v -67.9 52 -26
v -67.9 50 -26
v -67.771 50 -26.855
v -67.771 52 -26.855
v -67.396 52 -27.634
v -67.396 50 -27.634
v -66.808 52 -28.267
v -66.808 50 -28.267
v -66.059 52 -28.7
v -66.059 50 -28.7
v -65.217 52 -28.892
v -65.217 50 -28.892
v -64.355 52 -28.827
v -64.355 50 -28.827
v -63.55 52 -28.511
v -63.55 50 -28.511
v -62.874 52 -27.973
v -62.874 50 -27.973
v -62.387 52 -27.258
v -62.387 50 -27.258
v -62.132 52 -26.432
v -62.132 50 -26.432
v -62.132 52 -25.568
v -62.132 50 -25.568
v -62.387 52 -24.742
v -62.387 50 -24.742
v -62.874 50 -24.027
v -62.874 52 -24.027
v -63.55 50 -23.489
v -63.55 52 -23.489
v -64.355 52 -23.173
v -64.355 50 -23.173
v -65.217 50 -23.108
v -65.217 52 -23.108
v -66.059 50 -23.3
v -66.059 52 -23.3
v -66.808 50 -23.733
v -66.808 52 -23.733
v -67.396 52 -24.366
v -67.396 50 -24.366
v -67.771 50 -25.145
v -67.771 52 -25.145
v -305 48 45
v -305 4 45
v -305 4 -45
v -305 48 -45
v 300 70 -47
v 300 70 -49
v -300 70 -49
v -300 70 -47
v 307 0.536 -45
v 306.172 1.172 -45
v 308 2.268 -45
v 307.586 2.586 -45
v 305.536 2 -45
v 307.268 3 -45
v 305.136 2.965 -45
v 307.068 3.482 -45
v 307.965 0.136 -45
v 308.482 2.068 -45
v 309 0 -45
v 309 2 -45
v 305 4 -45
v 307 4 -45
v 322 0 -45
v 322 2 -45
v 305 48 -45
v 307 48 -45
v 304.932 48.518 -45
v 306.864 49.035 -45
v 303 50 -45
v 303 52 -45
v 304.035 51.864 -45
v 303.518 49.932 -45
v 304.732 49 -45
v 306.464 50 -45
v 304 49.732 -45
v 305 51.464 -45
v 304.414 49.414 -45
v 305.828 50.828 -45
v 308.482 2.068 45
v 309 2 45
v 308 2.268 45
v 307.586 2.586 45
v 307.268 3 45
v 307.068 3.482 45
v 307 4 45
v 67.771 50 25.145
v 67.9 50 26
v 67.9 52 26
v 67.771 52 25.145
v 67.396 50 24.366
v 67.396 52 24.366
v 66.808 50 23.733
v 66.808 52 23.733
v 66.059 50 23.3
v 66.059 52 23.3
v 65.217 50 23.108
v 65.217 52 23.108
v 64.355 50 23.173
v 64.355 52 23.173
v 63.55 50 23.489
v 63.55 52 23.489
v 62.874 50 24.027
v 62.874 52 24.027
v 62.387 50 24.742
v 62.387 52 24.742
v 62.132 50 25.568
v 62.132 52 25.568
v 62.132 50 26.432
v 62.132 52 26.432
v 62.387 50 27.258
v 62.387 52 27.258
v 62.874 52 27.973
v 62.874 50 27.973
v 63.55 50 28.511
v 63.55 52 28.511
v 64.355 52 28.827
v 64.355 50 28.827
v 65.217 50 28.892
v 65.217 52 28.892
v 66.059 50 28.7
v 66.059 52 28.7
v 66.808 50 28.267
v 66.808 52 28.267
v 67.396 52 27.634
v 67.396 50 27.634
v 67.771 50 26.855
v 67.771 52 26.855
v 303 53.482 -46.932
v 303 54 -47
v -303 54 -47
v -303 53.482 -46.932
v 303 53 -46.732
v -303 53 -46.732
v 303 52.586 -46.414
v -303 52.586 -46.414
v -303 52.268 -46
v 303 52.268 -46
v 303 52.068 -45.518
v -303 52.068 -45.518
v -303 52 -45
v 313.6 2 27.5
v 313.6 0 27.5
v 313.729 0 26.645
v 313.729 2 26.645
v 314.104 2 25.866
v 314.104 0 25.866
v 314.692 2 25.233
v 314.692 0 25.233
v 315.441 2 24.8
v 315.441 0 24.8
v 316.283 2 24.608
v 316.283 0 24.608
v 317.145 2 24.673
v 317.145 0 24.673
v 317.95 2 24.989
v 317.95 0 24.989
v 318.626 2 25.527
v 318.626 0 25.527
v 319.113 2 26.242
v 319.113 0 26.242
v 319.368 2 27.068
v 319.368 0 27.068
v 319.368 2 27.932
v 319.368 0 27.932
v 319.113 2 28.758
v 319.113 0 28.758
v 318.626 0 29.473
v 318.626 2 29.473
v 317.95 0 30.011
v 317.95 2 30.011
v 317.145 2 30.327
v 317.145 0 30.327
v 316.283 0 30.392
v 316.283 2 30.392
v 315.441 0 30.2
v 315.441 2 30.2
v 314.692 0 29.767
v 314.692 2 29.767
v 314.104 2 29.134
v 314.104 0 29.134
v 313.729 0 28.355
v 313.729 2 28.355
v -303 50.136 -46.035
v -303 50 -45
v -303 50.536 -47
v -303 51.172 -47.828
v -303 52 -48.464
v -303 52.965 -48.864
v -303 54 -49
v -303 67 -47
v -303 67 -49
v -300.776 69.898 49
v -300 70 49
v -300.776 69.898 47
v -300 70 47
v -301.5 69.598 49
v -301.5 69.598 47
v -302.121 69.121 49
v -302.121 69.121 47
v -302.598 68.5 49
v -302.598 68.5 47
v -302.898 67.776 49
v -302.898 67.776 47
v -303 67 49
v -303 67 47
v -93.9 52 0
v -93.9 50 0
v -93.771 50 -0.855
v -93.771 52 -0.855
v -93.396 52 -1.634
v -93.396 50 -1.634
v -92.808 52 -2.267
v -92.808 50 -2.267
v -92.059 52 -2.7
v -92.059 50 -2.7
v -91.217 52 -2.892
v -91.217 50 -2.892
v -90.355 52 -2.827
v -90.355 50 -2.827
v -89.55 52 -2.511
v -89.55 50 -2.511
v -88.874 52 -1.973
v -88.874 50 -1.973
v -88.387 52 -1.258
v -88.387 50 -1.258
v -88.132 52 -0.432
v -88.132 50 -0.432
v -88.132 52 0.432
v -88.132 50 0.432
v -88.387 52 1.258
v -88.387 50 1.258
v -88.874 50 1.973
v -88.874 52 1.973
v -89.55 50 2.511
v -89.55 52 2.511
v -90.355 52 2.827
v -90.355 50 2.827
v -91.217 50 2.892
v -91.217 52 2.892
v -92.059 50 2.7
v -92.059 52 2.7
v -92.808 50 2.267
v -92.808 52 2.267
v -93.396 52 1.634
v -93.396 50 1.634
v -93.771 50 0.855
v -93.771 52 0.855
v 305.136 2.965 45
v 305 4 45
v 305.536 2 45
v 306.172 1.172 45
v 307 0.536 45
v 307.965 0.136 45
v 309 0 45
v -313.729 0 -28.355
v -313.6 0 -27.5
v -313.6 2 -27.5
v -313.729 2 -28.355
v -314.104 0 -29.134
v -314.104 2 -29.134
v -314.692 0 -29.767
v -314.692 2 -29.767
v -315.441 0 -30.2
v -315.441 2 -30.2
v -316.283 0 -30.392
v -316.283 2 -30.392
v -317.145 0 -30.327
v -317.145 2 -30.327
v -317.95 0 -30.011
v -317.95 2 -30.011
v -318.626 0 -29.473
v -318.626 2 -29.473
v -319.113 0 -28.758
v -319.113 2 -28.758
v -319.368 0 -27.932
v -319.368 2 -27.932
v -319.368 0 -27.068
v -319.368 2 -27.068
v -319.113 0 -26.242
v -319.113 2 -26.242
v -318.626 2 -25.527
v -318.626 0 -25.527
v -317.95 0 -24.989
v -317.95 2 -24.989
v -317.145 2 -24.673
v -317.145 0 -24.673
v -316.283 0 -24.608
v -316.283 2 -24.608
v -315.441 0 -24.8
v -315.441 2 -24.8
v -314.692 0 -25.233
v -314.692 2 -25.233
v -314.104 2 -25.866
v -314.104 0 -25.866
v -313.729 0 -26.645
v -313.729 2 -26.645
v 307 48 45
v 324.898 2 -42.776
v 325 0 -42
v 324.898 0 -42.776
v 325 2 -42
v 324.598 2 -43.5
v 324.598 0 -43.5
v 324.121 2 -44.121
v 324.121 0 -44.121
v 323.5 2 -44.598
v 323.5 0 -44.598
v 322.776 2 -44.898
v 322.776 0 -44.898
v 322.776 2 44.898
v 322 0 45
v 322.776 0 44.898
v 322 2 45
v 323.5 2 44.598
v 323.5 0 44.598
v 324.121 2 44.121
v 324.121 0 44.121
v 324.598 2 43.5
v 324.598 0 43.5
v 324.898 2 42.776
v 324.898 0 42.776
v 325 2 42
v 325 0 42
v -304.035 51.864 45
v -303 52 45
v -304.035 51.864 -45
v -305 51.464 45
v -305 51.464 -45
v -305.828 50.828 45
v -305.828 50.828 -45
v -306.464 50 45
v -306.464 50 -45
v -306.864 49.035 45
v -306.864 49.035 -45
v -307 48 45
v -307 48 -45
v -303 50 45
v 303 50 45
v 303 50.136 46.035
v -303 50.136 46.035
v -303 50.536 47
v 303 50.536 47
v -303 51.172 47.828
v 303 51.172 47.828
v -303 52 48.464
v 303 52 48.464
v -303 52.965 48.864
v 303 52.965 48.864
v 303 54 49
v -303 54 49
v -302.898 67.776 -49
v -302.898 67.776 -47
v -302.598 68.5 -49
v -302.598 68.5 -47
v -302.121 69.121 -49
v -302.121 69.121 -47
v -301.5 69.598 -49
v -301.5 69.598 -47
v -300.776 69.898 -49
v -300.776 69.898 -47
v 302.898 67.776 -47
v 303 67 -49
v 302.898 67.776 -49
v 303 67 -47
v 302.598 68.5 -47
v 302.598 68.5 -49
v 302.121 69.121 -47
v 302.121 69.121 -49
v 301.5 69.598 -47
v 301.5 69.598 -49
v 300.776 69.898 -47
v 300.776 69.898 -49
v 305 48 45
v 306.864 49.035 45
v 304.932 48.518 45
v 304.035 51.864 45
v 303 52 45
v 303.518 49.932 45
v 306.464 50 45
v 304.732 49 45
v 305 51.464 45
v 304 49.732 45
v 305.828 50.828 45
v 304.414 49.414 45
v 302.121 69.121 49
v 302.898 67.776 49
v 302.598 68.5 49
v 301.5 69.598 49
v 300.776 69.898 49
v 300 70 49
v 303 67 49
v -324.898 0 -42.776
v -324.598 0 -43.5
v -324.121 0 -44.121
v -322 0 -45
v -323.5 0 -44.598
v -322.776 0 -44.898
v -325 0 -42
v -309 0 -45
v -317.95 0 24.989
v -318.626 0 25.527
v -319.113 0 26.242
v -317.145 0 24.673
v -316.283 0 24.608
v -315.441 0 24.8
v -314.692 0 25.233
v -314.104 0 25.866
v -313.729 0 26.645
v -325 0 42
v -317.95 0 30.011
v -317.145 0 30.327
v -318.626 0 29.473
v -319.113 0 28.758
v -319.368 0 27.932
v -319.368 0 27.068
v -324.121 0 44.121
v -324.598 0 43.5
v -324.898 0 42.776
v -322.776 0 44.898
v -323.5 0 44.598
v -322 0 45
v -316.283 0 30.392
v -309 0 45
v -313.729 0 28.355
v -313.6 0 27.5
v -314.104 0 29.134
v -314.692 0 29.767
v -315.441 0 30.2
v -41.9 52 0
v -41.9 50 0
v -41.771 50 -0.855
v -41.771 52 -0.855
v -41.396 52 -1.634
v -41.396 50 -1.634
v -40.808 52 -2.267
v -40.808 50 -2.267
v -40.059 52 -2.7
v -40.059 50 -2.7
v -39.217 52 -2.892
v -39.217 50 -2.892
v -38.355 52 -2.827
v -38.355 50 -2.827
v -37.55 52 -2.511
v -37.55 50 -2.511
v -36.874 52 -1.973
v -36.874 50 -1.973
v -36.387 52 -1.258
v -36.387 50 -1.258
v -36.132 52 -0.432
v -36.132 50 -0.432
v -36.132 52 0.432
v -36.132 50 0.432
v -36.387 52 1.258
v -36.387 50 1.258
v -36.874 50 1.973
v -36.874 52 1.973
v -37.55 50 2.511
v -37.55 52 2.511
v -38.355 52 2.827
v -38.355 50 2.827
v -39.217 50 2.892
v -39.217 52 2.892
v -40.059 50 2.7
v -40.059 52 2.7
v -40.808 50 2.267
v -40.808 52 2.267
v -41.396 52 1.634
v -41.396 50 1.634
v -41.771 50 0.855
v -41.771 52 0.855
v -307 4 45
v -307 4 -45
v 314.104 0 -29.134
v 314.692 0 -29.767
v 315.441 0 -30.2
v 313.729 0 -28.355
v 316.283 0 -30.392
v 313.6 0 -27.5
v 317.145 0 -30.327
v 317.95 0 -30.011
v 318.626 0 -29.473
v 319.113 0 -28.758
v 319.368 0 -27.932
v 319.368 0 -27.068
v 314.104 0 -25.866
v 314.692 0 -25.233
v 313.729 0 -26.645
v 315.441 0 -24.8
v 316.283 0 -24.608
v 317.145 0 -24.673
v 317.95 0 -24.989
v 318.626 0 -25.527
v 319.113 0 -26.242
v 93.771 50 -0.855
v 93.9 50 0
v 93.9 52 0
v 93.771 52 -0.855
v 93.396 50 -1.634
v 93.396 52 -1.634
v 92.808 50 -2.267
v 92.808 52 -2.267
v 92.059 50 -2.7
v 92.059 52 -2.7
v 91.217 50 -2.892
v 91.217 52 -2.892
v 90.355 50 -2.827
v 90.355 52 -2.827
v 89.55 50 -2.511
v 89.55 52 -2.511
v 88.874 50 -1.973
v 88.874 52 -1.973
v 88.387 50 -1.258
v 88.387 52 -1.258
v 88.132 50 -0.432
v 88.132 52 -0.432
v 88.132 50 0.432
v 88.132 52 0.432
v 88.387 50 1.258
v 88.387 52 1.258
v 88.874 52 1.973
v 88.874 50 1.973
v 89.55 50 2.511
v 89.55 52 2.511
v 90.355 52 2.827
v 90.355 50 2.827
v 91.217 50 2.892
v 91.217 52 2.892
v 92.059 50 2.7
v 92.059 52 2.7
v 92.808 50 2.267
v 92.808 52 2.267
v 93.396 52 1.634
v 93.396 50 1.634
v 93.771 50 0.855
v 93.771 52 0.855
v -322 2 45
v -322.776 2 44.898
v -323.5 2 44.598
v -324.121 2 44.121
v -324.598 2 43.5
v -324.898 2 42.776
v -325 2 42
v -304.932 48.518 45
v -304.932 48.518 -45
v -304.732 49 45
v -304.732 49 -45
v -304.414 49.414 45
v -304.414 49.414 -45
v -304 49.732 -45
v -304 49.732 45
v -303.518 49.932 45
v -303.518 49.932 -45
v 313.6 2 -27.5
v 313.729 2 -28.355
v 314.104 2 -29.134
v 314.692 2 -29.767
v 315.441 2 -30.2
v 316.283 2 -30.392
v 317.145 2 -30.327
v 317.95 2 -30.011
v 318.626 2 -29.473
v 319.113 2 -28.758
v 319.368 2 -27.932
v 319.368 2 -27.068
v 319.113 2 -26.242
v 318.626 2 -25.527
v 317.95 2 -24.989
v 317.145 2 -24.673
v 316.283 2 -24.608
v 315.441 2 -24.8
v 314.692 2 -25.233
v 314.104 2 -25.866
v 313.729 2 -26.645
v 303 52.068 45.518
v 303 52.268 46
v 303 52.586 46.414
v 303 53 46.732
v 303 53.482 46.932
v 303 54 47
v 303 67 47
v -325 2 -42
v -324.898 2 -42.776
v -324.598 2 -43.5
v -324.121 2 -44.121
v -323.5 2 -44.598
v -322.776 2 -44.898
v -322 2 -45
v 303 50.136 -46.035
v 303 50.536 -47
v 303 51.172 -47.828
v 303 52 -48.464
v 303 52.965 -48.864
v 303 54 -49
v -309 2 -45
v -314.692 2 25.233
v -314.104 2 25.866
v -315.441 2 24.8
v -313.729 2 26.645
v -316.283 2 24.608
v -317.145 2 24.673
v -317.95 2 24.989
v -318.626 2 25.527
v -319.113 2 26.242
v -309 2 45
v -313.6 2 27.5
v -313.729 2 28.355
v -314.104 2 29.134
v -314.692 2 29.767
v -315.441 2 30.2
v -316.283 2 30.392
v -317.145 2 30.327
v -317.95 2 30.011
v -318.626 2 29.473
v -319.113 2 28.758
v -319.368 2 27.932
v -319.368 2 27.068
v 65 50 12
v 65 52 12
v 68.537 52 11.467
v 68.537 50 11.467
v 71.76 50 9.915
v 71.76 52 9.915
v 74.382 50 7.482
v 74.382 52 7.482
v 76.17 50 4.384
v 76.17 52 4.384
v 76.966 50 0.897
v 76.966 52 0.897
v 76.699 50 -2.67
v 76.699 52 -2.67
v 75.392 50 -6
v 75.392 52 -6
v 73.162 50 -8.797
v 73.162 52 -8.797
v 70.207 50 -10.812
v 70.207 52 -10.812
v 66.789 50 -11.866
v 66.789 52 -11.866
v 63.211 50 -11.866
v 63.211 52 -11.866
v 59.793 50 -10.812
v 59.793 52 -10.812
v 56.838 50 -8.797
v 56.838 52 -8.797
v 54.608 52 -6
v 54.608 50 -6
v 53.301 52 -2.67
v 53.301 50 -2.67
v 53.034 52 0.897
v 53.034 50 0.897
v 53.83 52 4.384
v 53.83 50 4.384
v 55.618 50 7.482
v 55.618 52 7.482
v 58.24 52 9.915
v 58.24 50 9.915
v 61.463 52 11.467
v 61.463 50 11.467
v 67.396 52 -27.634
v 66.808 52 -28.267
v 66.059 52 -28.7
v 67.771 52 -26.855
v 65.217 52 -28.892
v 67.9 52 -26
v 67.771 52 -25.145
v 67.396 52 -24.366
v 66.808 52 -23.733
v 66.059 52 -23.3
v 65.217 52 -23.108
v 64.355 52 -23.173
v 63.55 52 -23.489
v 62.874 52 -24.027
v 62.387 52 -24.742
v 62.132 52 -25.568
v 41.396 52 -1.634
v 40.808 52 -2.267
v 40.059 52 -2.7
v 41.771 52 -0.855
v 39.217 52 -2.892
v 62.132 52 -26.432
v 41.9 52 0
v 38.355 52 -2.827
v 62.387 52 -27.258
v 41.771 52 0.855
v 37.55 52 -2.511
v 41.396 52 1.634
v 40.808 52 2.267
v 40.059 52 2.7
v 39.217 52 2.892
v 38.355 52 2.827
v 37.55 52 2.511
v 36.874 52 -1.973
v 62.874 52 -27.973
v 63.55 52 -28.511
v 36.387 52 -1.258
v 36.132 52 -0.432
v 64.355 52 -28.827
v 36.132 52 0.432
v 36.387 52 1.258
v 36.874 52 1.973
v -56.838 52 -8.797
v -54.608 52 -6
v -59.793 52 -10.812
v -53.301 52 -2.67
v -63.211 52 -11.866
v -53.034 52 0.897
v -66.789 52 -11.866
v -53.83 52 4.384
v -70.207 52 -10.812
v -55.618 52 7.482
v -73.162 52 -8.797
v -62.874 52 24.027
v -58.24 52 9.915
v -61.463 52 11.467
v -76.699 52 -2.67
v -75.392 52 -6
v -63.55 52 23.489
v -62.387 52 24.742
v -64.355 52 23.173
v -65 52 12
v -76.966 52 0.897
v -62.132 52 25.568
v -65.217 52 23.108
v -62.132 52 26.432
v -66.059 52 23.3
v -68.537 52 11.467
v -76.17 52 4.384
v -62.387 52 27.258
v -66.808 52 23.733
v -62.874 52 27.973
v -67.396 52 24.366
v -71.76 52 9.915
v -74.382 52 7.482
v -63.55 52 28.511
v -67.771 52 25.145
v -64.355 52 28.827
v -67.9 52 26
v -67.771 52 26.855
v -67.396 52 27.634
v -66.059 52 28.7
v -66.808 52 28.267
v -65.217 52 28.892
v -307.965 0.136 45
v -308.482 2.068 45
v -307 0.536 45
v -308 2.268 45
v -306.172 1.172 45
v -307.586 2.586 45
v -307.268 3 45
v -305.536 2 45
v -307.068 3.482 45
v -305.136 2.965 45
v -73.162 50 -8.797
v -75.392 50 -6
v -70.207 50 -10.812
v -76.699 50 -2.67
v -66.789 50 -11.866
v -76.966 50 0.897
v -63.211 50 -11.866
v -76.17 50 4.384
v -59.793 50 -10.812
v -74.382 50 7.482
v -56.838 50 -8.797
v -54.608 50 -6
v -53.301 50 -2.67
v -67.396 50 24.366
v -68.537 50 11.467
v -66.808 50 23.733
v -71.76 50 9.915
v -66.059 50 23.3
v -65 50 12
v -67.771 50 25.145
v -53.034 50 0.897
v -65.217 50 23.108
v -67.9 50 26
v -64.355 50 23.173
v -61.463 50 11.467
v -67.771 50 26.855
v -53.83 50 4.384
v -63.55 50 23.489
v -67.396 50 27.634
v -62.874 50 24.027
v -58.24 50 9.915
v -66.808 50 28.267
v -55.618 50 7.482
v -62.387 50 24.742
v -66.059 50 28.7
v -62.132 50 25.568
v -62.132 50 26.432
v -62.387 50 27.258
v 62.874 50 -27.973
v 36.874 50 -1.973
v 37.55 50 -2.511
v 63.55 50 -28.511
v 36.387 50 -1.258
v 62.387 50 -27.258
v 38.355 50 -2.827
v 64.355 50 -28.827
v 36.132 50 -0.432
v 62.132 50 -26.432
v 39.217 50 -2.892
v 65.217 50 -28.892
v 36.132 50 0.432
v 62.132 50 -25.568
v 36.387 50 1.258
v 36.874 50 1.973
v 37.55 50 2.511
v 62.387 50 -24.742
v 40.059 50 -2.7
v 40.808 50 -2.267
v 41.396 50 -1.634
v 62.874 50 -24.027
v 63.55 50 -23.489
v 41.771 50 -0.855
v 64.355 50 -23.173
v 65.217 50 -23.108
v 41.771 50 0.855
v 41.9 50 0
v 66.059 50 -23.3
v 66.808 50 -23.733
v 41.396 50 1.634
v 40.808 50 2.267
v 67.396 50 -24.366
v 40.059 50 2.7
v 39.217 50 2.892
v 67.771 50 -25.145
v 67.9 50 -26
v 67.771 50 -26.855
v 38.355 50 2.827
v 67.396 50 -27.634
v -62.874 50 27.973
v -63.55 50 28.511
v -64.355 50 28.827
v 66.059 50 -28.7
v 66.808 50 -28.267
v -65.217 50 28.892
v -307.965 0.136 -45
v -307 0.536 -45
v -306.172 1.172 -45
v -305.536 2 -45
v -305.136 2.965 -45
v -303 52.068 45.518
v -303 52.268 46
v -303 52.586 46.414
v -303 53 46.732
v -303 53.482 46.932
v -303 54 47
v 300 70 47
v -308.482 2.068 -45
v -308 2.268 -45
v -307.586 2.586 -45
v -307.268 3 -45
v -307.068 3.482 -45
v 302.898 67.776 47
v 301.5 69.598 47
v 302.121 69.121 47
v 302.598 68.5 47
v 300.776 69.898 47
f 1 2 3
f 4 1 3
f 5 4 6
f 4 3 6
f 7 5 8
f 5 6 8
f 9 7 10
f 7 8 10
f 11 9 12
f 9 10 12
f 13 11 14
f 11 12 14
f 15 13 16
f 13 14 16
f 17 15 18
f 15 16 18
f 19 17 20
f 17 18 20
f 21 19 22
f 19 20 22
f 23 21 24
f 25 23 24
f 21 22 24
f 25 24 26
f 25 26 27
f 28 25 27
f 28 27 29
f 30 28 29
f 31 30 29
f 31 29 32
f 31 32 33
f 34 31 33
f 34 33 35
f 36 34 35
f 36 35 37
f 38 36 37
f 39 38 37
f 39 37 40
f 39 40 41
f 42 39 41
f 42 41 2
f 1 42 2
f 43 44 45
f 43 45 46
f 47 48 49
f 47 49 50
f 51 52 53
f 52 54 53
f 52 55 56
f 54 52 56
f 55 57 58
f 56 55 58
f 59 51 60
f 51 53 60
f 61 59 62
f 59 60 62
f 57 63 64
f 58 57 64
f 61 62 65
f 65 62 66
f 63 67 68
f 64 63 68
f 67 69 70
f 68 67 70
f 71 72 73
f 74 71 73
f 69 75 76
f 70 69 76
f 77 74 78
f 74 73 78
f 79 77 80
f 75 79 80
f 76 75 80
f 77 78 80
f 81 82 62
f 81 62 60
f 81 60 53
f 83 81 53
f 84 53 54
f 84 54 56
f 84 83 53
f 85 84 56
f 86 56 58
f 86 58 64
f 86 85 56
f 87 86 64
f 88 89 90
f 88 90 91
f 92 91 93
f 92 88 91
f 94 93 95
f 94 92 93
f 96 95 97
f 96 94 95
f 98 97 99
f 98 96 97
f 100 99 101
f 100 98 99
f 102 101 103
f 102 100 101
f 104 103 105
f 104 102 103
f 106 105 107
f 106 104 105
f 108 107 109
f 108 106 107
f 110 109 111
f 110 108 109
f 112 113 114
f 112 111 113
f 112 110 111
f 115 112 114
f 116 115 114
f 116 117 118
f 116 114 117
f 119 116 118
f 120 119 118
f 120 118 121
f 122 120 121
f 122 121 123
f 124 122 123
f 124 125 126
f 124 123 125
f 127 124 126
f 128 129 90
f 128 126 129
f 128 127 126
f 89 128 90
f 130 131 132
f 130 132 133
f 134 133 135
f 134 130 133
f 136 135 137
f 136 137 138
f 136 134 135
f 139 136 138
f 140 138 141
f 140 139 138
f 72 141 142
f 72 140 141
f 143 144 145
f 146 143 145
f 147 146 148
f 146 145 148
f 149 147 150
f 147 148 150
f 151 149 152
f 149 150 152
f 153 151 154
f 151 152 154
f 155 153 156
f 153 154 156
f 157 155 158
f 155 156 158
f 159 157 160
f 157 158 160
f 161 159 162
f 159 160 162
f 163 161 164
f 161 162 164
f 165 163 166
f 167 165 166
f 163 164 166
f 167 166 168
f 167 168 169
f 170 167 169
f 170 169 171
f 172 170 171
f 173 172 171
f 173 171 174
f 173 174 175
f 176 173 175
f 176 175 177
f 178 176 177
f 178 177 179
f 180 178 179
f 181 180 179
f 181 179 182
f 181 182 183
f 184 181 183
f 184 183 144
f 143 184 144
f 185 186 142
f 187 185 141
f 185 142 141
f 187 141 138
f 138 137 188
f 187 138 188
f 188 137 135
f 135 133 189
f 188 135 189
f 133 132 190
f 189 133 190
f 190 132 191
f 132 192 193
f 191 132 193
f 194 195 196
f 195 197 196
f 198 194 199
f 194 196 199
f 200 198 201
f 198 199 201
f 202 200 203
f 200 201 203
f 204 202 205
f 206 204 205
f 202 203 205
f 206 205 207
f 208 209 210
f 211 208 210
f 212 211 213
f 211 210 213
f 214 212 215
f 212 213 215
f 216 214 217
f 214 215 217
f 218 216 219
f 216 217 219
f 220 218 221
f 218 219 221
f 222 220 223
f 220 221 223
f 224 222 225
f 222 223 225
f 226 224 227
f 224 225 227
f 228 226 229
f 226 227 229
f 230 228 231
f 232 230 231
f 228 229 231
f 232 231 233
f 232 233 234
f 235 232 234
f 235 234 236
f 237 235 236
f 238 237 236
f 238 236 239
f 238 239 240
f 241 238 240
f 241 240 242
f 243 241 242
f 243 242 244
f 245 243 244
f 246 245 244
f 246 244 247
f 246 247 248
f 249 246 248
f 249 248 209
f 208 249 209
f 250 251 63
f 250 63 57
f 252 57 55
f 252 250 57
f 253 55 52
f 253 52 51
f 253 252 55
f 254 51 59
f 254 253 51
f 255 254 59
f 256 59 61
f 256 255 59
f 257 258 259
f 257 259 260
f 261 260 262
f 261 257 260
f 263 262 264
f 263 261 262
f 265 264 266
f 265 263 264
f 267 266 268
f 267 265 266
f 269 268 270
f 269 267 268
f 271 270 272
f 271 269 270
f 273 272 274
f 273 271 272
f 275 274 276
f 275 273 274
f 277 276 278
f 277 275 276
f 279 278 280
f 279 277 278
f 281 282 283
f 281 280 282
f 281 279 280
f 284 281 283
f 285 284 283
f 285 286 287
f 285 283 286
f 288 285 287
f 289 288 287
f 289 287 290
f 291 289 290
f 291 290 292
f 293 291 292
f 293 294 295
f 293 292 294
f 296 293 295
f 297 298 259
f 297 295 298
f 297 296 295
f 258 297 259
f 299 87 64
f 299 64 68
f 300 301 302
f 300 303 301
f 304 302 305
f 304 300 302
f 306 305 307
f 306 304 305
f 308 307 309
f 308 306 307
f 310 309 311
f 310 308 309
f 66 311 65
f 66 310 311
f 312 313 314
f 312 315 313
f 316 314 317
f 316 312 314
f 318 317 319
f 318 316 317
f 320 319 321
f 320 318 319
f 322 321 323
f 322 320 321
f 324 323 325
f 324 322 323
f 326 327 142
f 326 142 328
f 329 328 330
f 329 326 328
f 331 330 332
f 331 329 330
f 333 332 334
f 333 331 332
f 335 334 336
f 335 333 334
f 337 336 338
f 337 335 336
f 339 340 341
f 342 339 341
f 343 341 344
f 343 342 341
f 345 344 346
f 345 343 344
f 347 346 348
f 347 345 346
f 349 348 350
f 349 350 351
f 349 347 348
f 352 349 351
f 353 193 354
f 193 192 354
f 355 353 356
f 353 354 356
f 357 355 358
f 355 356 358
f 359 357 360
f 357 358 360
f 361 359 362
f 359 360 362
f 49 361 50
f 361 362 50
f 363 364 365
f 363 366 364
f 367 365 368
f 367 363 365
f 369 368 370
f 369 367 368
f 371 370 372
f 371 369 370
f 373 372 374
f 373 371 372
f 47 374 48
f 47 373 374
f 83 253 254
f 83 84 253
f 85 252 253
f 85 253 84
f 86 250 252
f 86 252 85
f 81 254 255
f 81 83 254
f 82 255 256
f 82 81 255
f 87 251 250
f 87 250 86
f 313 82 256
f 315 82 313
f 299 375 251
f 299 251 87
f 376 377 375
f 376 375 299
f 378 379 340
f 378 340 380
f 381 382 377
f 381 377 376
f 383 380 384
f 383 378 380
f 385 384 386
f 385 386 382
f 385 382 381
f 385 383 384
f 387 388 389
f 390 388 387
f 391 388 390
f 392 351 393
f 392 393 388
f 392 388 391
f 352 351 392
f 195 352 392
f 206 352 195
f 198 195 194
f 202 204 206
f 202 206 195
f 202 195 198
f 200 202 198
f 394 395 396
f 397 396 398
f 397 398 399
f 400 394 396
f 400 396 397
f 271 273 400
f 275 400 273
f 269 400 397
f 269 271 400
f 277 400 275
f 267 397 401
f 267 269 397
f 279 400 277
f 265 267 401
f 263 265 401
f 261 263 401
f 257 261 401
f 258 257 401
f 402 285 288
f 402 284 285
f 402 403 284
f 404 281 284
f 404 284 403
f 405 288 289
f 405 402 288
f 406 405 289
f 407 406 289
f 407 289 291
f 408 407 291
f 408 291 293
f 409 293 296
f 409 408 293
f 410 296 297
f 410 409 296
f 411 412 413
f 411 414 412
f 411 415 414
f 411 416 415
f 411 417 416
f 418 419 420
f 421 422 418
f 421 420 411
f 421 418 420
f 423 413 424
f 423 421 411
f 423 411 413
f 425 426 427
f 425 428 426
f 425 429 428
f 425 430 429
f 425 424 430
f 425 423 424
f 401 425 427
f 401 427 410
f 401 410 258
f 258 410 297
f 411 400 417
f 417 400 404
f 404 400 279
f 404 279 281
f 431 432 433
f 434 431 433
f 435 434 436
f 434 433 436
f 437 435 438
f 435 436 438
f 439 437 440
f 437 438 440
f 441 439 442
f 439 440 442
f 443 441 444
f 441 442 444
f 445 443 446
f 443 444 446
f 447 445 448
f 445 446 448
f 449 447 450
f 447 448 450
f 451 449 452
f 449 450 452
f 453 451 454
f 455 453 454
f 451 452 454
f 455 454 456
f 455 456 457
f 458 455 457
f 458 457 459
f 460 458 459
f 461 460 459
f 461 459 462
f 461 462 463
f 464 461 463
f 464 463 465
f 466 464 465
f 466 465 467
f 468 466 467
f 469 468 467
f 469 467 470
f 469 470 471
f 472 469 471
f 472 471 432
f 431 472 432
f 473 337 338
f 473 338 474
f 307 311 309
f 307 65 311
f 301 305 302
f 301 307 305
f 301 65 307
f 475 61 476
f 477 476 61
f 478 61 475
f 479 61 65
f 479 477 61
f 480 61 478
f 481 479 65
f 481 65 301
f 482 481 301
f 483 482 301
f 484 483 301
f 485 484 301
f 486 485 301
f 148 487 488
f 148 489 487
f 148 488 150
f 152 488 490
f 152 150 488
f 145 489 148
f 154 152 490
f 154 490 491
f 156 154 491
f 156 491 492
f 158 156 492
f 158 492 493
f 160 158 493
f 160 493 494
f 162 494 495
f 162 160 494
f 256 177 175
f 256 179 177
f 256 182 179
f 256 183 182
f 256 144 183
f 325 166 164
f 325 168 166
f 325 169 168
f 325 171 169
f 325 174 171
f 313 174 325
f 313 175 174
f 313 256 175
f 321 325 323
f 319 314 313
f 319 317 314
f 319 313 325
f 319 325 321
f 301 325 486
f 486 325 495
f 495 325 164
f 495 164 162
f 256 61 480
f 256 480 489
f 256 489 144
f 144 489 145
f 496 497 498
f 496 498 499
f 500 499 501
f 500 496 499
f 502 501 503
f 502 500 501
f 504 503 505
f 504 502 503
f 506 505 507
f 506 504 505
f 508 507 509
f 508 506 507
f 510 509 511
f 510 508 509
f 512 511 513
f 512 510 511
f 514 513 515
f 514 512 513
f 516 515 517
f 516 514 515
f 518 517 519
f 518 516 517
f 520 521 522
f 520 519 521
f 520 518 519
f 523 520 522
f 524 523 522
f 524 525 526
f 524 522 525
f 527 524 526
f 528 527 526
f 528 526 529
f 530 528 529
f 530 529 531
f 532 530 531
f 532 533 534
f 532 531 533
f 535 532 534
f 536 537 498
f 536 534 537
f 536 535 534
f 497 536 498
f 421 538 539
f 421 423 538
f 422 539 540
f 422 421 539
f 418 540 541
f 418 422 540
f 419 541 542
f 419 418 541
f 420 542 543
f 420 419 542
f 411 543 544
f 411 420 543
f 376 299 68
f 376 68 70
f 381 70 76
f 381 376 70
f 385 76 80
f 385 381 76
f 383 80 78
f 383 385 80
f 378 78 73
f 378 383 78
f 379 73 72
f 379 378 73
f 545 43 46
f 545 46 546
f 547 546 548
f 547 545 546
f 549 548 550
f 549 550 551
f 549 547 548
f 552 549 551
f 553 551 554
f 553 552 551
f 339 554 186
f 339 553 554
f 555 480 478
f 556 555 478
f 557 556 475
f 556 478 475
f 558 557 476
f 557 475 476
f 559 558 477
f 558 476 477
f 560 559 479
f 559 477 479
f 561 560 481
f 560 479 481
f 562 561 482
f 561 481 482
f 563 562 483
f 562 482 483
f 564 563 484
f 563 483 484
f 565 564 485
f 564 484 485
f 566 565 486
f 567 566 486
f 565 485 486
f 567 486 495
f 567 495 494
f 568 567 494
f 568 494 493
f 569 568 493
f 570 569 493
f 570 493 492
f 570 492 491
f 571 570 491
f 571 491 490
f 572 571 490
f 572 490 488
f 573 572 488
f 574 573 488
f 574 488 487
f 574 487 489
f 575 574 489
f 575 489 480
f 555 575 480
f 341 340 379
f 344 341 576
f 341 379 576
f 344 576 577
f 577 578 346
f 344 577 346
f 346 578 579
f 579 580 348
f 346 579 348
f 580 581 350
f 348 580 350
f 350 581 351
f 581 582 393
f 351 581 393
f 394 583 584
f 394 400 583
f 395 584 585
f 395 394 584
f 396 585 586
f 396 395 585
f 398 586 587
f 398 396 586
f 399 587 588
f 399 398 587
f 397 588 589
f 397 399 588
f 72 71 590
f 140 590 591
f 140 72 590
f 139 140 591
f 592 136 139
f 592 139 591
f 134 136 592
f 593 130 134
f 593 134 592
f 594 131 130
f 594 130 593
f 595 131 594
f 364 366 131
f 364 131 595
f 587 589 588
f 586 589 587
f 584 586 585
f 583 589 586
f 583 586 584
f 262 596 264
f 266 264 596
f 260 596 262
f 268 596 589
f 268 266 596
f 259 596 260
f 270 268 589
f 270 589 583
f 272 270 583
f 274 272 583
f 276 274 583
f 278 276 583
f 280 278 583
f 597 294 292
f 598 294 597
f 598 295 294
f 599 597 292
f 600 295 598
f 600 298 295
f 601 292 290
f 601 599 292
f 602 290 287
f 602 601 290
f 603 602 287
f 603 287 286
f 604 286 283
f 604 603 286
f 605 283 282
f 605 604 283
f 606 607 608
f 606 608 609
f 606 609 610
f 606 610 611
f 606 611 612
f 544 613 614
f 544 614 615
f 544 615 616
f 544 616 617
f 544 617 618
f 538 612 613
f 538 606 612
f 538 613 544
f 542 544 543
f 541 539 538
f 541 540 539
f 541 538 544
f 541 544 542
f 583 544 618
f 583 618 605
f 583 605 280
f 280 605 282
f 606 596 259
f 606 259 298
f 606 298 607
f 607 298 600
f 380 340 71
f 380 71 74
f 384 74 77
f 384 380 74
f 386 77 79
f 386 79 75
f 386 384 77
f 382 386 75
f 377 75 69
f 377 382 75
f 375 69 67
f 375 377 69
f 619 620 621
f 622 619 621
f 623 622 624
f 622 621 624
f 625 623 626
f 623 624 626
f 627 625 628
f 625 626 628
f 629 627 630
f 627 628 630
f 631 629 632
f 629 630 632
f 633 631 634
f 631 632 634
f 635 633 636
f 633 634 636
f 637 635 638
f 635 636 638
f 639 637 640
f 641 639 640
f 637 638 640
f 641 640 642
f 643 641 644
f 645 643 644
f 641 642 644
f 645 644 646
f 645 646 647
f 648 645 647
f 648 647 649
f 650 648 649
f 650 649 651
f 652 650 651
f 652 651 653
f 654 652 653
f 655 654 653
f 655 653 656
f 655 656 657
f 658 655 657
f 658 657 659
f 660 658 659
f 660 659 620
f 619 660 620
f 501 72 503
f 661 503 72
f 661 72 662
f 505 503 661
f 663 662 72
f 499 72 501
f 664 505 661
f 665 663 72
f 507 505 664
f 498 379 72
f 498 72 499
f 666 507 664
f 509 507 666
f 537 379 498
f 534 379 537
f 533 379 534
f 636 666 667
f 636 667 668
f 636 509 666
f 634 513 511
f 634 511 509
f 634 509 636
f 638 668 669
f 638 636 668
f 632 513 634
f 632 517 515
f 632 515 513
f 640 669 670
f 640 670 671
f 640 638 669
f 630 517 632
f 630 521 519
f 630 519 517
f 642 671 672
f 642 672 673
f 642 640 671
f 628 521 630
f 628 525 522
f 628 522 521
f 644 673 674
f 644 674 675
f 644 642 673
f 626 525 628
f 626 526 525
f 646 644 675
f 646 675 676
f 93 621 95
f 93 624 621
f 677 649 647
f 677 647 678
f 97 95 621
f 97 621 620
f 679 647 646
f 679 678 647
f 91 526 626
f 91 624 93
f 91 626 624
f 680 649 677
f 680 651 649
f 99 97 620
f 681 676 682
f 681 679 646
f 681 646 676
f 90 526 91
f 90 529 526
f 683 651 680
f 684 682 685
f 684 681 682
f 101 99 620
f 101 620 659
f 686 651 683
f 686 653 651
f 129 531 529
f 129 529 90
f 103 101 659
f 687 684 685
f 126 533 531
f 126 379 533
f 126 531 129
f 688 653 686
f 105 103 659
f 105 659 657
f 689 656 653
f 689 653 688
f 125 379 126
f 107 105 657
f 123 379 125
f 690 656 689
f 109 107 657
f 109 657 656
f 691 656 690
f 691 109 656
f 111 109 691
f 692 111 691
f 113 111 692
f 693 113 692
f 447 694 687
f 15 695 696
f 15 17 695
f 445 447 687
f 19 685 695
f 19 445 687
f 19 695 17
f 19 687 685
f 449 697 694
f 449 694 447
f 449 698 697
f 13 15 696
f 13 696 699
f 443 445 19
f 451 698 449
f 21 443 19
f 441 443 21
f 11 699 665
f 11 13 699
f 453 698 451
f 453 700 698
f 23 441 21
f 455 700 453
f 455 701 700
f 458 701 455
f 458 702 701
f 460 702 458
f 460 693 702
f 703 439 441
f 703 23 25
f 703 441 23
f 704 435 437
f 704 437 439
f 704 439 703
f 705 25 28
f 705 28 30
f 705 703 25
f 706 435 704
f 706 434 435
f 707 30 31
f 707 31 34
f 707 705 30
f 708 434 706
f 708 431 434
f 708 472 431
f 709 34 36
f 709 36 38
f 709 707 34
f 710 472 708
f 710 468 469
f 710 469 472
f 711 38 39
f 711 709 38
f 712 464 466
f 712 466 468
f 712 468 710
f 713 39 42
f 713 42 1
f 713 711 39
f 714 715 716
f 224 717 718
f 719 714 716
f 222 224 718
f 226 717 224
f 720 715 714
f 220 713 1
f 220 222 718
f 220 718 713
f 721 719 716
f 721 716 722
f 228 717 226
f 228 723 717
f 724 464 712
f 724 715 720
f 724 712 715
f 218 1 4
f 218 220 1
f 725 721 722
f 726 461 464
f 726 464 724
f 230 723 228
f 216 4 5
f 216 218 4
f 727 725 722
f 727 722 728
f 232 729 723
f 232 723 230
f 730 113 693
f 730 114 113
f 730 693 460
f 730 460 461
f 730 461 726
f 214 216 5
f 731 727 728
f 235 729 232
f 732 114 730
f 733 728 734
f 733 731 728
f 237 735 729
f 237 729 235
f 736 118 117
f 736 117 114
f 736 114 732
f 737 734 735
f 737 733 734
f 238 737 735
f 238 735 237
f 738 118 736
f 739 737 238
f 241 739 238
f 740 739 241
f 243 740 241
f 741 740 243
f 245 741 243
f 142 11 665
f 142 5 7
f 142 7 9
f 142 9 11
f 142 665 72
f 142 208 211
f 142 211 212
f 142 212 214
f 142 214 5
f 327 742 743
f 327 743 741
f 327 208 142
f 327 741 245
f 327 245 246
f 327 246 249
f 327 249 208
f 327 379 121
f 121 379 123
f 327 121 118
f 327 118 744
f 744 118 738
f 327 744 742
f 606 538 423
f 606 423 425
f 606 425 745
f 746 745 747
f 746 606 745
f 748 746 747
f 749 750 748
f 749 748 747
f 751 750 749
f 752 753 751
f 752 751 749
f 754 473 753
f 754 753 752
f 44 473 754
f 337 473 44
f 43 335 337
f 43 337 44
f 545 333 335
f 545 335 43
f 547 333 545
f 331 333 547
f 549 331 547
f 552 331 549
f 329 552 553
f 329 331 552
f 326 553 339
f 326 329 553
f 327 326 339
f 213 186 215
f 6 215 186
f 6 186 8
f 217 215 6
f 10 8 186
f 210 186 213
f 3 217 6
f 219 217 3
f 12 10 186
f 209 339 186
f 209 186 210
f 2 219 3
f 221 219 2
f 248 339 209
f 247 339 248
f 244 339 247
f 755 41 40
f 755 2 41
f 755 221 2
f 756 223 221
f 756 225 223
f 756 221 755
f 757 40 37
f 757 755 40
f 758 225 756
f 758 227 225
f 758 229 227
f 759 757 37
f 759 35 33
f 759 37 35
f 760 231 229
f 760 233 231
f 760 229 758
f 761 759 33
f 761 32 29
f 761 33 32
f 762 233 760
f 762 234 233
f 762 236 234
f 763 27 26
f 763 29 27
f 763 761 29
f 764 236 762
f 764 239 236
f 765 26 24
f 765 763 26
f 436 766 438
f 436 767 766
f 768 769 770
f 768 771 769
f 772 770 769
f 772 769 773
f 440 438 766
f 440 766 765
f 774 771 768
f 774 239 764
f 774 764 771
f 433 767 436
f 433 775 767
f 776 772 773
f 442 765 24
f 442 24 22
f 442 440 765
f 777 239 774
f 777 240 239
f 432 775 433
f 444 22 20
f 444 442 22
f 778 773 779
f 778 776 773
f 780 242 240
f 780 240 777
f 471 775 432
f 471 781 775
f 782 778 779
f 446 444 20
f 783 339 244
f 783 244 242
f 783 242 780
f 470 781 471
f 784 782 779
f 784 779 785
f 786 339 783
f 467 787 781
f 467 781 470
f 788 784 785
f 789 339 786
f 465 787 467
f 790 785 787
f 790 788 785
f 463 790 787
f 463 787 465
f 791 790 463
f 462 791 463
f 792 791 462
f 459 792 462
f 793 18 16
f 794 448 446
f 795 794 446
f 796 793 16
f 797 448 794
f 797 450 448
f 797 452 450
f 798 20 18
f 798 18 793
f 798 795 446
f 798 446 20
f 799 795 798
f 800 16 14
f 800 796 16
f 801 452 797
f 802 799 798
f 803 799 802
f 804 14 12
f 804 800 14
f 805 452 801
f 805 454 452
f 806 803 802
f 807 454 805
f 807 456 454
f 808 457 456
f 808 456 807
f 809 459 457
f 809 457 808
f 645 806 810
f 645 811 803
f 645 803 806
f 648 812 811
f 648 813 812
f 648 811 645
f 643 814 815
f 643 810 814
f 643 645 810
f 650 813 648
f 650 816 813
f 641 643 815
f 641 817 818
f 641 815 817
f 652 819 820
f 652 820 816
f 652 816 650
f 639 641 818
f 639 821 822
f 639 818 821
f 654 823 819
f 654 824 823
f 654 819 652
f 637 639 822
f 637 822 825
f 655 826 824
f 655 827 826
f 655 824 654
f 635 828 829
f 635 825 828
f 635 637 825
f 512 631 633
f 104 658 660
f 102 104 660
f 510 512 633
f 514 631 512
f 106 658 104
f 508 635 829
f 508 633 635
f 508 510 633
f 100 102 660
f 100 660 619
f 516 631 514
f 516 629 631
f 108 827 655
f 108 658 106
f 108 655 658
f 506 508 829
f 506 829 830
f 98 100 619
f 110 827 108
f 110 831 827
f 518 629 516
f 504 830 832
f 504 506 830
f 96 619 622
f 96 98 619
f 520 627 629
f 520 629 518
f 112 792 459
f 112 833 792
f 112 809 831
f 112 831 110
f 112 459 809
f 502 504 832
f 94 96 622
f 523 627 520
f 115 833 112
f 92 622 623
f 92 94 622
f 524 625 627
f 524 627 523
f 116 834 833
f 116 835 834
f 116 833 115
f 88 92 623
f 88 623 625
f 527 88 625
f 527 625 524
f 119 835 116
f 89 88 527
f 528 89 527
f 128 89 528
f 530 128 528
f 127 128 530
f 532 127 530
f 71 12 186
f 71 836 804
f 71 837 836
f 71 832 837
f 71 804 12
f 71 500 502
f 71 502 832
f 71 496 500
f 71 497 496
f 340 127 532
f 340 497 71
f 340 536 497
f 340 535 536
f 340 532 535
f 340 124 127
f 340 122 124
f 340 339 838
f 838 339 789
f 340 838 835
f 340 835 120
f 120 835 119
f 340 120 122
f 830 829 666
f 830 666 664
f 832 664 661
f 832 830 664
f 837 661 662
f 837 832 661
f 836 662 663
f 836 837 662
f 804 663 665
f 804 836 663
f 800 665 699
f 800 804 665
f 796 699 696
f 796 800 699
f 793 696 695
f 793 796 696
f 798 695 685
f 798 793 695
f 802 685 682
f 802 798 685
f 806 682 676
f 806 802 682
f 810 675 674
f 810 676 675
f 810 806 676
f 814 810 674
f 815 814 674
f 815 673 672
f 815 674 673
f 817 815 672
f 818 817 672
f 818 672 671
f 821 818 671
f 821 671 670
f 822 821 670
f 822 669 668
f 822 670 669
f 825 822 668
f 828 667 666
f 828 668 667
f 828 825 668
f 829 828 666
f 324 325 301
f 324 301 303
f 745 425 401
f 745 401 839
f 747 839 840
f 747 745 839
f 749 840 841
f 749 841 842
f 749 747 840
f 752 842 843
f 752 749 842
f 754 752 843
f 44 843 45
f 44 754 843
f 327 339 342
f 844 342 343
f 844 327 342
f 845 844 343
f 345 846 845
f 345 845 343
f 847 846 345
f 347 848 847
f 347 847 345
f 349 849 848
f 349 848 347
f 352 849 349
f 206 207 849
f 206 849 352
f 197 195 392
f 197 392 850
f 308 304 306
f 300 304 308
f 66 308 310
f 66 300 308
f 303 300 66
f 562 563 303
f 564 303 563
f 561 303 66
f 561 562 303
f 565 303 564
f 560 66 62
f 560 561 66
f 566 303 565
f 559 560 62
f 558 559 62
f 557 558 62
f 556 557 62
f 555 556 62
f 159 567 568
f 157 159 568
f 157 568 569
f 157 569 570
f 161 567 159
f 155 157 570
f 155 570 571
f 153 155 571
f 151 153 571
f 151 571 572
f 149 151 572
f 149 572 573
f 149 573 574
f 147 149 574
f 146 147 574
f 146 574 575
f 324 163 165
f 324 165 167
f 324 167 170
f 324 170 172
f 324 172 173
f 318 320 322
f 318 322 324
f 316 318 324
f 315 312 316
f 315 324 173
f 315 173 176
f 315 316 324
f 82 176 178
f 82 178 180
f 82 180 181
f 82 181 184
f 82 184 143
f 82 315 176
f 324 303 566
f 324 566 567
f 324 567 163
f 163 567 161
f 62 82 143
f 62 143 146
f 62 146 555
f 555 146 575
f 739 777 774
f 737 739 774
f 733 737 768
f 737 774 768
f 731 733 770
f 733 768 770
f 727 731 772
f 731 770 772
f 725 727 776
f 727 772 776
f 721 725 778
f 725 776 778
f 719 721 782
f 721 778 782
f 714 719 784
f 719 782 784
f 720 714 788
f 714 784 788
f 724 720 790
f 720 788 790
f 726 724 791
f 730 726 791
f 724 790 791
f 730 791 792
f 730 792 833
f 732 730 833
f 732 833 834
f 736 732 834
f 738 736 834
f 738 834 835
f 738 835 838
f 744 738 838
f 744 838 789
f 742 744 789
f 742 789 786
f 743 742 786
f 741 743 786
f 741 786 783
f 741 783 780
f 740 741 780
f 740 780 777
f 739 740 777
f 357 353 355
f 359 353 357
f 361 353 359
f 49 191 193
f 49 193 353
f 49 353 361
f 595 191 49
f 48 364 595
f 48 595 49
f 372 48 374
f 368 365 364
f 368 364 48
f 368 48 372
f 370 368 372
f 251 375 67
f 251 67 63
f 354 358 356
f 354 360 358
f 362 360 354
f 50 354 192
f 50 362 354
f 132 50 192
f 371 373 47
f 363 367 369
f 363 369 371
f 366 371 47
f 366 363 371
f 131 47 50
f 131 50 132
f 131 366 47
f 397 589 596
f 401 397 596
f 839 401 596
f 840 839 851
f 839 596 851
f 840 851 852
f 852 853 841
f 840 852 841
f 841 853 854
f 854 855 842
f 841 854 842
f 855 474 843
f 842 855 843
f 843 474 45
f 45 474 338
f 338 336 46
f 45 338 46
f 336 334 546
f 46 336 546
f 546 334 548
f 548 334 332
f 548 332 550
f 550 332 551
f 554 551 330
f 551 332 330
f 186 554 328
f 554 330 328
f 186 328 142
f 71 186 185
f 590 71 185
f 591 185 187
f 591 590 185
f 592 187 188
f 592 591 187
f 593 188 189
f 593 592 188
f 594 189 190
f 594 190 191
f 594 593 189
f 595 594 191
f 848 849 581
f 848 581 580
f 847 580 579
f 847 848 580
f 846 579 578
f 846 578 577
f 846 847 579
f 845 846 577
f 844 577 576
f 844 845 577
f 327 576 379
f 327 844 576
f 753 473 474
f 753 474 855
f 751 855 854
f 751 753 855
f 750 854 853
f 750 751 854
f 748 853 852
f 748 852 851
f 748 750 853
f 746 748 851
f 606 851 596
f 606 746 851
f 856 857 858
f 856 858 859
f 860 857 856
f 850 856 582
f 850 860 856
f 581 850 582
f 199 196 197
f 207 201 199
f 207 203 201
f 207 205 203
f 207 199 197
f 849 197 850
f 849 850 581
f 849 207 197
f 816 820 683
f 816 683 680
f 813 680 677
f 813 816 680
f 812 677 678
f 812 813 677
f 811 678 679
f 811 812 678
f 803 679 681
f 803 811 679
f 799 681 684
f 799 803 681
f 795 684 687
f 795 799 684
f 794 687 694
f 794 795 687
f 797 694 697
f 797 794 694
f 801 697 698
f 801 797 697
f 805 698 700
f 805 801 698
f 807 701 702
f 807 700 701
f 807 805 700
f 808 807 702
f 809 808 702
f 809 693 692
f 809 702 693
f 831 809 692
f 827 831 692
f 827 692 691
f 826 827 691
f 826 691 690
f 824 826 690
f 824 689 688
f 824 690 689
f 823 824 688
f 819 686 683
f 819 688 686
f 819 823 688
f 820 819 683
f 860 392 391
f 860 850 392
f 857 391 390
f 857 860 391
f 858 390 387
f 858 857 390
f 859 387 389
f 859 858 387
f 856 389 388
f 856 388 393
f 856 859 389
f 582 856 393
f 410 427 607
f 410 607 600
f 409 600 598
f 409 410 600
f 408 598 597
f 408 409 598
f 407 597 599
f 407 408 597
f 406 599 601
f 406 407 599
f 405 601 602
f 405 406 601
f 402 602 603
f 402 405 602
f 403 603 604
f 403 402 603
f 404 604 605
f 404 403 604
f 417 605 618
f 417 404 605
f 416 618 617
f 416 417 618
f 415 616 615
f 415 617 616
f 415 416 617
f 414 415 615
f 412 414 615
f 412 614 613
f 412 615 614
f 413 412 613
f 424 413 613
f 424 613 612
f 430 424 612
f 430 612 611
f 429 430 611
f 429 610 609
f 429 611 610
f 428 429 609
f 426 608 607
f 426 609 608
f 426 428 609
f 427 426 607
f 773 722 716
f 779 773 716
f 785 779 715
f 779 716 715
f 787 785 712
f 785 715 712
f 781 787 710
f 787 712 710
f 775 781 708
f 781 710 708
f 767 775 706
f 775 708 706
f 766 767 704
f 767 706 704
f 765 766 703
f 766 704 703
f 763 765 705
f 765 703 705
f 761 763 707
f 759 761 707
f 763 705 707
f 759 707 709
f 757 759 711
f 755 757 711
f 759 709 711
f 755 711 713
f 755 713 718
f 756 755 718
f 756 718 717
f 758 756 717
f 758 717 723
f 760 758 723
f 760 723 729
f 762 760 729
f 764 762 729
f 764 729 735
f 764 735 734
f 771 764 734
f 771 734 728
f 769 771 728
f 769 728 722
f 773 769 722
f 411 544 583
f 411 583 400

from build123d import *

# Parameters (mm, degrees)
BASE_FLANGE1_DEPTH      = 45
EDGE_FLANGE1_DEPTH      = 606
EDGE_FLANGE1_BEND_DEPTH = 606
SKETCH11_R              = 12
CUT_EXTRUDE1_DEPTH      = 10
FILLET1_R               = 3
M5_CLEARANCE_HOLE1_D    = 5.8
M5_CLEARANCE_HOLE2_D    = 5.8


# Sheet-metal steps are written as plain solids
with BuildPart() as part:
    # Sketch1 → Base-Flange1 (new, symmetric)
    with BuildSketch(Plane.XY):
        with BuildLine():
            Line((-325, 0), (-309, 0))
            ThreePointArc((-309, 0), (-306.171572875, 1.171572875), (-305, 4))
            Line((-305, 4), (-305, 48))
            ThreePointArc((-305, 48), (-304.414213562, 49.414213562), (-303, 50))
            Line((-303, 50), (303, 50))
            ThreePointArc((303, 50), (304.414213562, 49.414213562), (305, 48))
            Line((305, 48), (305, 4))
            ThreePointArc((305, 4), (306.171572875, 1.171572875), (309, 0))
            Line((309, 0), (325, 0))
            Line((325, 0), (325, 2))
            Line((325, 2), (309, 2))
            ThreePointArc((309, 2), (307.585786438, 2.585786438), (307, 4))
            Line((307, 4), (307, 48))
            ThreePointArc((307, 48), (305.828427125, 50.828427125), (303, 52))
            Line((303, 52), (-303, 52))
            ThreePointArc((-303, 52), (-305.828427125, 50.828427125), (-307, 48))
            Line((-307, 48), (-307, 4))
            ThreePointArc((-307, 4), (-307.585786438, 2.585786438), (-309, 2))
            Line((-309, 2), (-325, 2))
            Line((-325, 2), (-325, 0))
        make_face()
    extrude(amount=BASE_FLANGE1_DEPTH, both=True)

    # Edge-Flange1 section (across the edge) → Edge-Flange1 (add)
    with BuildSketch(Plane(origin=(303, 52, -47), x_dir=(0, 0, 1), z_dir=(-1, 0, 0))):
        with BuildLine():
            Line((-2, 2), (-2, 18))
            Line((-2, 18), (0, 18))
            Line((0, 18), (0, 2))
            ThreePointArc((0, 2), (0.585786438, 0.585786438), (2, 0))
            Line((2, 0), (2, -2))
            ThreePointArc((2, -2), (-0.828427125, -0.828427125), (-2, 2))
        make_face()
    extrude(amount=EDGE_FLANGE1_DEPTH)

    # Edge-Flange1 section 2 (across the edge) → Edge-Flange1 bend (add)
    with BuildSketch(Plane(origin=(-303, 52, 47), x_dir=(0, 0, -1), z_dir=(1, 0, 0))):
        with BuildLine():
            Line((-2, 2), (-2, 18))
            Line((-2, 18), (0, 18))
            Line((0, 18), (0, 2))
            ThreePointArc((0, 2), (0.585786438, 0.585786438), (2, 0))
            Line((2, 0), (2, -2))
            ThreePointArc((2, -2), (-0.828427125, -0.828427125), (-2, 2))
        make_face()
    extrude(amount=EDGE_FLANGE1_BEND_DEPTH)

    # Sketch11 → Cut-Extrude1 (cut)
    with BuildSketch(Plane(origin=(0, 52, 0), x_dir=(1, 0, 0), z_dir=(0, 1, 0))):
        with Locations(Location((-65, 0, 0), (0, 0, 270))):
            Circle(SKETCH11_R)
        with Locations(Location((65, 0, 0), (0, 0, 270))):
            Circle(SKETCH11_R)
    extrude(amount=-CUT_EXTRUDE1_DEPTH, mode=Mode.SUBTRACT)

    # Fillet1
    fillet1_edges = [part.edges().sort_by_distance(p)[0] for p in [
        (-325, 1, -45),
        (325, 1, -45),
        (-325, 1, 45),
        (303, 70, -48),
        (-303, 70, -48),
        (325, 1, 45),
        (-303, 70, 48),
        (303, 70, 48),
    ]]
    fillet(fillet1_edges, radius=FILLET1_R)

    # M5 Clearance Hole1 (through all)
    with Locations(Plane(origin=(0, 2, 0), x_dir=(1, 0, 0), z_dir=(0, 1, 0))):
        with Locations((316.5, 27.5), (316.5, -27.5)):
            m5_clearance_hole1 = Hole(M5_CLEARANCE_HOLE1_D / 2)

    # Mirror1: M5 Clearance Hole1 across plane
    add(m5_clearance_hole1.mirror(Plane(origin=(0, 0, 0), x_dir=(0, 0, 1), z_dir=(1, 0, 0))), mode=Mode.SUBTRACT)

    # M5 Clearance Hole2 (through all)
    with Locations(Plane(origin=(0, 52, 0), x_dir=(1, 0, 0), z_dir=(0, 1, 0))):
        with Locations((-91, 0), (-65, 26), (-39, 0), (-65, -26)):
            m5_clearance_hole2 = Hole(M5_CLEARANCE_HOLE2_D / 2)

    # Mirror2: M5 Clearance Hole2 across plane
    add(m5_clearance_hole2.mirror(Plane(origin=(0, 0, 0), x_dir=(0, 0, 1), z_dir=(1, 0, 0))), mode=Mode.SUBTRACT)


solid = part.part
